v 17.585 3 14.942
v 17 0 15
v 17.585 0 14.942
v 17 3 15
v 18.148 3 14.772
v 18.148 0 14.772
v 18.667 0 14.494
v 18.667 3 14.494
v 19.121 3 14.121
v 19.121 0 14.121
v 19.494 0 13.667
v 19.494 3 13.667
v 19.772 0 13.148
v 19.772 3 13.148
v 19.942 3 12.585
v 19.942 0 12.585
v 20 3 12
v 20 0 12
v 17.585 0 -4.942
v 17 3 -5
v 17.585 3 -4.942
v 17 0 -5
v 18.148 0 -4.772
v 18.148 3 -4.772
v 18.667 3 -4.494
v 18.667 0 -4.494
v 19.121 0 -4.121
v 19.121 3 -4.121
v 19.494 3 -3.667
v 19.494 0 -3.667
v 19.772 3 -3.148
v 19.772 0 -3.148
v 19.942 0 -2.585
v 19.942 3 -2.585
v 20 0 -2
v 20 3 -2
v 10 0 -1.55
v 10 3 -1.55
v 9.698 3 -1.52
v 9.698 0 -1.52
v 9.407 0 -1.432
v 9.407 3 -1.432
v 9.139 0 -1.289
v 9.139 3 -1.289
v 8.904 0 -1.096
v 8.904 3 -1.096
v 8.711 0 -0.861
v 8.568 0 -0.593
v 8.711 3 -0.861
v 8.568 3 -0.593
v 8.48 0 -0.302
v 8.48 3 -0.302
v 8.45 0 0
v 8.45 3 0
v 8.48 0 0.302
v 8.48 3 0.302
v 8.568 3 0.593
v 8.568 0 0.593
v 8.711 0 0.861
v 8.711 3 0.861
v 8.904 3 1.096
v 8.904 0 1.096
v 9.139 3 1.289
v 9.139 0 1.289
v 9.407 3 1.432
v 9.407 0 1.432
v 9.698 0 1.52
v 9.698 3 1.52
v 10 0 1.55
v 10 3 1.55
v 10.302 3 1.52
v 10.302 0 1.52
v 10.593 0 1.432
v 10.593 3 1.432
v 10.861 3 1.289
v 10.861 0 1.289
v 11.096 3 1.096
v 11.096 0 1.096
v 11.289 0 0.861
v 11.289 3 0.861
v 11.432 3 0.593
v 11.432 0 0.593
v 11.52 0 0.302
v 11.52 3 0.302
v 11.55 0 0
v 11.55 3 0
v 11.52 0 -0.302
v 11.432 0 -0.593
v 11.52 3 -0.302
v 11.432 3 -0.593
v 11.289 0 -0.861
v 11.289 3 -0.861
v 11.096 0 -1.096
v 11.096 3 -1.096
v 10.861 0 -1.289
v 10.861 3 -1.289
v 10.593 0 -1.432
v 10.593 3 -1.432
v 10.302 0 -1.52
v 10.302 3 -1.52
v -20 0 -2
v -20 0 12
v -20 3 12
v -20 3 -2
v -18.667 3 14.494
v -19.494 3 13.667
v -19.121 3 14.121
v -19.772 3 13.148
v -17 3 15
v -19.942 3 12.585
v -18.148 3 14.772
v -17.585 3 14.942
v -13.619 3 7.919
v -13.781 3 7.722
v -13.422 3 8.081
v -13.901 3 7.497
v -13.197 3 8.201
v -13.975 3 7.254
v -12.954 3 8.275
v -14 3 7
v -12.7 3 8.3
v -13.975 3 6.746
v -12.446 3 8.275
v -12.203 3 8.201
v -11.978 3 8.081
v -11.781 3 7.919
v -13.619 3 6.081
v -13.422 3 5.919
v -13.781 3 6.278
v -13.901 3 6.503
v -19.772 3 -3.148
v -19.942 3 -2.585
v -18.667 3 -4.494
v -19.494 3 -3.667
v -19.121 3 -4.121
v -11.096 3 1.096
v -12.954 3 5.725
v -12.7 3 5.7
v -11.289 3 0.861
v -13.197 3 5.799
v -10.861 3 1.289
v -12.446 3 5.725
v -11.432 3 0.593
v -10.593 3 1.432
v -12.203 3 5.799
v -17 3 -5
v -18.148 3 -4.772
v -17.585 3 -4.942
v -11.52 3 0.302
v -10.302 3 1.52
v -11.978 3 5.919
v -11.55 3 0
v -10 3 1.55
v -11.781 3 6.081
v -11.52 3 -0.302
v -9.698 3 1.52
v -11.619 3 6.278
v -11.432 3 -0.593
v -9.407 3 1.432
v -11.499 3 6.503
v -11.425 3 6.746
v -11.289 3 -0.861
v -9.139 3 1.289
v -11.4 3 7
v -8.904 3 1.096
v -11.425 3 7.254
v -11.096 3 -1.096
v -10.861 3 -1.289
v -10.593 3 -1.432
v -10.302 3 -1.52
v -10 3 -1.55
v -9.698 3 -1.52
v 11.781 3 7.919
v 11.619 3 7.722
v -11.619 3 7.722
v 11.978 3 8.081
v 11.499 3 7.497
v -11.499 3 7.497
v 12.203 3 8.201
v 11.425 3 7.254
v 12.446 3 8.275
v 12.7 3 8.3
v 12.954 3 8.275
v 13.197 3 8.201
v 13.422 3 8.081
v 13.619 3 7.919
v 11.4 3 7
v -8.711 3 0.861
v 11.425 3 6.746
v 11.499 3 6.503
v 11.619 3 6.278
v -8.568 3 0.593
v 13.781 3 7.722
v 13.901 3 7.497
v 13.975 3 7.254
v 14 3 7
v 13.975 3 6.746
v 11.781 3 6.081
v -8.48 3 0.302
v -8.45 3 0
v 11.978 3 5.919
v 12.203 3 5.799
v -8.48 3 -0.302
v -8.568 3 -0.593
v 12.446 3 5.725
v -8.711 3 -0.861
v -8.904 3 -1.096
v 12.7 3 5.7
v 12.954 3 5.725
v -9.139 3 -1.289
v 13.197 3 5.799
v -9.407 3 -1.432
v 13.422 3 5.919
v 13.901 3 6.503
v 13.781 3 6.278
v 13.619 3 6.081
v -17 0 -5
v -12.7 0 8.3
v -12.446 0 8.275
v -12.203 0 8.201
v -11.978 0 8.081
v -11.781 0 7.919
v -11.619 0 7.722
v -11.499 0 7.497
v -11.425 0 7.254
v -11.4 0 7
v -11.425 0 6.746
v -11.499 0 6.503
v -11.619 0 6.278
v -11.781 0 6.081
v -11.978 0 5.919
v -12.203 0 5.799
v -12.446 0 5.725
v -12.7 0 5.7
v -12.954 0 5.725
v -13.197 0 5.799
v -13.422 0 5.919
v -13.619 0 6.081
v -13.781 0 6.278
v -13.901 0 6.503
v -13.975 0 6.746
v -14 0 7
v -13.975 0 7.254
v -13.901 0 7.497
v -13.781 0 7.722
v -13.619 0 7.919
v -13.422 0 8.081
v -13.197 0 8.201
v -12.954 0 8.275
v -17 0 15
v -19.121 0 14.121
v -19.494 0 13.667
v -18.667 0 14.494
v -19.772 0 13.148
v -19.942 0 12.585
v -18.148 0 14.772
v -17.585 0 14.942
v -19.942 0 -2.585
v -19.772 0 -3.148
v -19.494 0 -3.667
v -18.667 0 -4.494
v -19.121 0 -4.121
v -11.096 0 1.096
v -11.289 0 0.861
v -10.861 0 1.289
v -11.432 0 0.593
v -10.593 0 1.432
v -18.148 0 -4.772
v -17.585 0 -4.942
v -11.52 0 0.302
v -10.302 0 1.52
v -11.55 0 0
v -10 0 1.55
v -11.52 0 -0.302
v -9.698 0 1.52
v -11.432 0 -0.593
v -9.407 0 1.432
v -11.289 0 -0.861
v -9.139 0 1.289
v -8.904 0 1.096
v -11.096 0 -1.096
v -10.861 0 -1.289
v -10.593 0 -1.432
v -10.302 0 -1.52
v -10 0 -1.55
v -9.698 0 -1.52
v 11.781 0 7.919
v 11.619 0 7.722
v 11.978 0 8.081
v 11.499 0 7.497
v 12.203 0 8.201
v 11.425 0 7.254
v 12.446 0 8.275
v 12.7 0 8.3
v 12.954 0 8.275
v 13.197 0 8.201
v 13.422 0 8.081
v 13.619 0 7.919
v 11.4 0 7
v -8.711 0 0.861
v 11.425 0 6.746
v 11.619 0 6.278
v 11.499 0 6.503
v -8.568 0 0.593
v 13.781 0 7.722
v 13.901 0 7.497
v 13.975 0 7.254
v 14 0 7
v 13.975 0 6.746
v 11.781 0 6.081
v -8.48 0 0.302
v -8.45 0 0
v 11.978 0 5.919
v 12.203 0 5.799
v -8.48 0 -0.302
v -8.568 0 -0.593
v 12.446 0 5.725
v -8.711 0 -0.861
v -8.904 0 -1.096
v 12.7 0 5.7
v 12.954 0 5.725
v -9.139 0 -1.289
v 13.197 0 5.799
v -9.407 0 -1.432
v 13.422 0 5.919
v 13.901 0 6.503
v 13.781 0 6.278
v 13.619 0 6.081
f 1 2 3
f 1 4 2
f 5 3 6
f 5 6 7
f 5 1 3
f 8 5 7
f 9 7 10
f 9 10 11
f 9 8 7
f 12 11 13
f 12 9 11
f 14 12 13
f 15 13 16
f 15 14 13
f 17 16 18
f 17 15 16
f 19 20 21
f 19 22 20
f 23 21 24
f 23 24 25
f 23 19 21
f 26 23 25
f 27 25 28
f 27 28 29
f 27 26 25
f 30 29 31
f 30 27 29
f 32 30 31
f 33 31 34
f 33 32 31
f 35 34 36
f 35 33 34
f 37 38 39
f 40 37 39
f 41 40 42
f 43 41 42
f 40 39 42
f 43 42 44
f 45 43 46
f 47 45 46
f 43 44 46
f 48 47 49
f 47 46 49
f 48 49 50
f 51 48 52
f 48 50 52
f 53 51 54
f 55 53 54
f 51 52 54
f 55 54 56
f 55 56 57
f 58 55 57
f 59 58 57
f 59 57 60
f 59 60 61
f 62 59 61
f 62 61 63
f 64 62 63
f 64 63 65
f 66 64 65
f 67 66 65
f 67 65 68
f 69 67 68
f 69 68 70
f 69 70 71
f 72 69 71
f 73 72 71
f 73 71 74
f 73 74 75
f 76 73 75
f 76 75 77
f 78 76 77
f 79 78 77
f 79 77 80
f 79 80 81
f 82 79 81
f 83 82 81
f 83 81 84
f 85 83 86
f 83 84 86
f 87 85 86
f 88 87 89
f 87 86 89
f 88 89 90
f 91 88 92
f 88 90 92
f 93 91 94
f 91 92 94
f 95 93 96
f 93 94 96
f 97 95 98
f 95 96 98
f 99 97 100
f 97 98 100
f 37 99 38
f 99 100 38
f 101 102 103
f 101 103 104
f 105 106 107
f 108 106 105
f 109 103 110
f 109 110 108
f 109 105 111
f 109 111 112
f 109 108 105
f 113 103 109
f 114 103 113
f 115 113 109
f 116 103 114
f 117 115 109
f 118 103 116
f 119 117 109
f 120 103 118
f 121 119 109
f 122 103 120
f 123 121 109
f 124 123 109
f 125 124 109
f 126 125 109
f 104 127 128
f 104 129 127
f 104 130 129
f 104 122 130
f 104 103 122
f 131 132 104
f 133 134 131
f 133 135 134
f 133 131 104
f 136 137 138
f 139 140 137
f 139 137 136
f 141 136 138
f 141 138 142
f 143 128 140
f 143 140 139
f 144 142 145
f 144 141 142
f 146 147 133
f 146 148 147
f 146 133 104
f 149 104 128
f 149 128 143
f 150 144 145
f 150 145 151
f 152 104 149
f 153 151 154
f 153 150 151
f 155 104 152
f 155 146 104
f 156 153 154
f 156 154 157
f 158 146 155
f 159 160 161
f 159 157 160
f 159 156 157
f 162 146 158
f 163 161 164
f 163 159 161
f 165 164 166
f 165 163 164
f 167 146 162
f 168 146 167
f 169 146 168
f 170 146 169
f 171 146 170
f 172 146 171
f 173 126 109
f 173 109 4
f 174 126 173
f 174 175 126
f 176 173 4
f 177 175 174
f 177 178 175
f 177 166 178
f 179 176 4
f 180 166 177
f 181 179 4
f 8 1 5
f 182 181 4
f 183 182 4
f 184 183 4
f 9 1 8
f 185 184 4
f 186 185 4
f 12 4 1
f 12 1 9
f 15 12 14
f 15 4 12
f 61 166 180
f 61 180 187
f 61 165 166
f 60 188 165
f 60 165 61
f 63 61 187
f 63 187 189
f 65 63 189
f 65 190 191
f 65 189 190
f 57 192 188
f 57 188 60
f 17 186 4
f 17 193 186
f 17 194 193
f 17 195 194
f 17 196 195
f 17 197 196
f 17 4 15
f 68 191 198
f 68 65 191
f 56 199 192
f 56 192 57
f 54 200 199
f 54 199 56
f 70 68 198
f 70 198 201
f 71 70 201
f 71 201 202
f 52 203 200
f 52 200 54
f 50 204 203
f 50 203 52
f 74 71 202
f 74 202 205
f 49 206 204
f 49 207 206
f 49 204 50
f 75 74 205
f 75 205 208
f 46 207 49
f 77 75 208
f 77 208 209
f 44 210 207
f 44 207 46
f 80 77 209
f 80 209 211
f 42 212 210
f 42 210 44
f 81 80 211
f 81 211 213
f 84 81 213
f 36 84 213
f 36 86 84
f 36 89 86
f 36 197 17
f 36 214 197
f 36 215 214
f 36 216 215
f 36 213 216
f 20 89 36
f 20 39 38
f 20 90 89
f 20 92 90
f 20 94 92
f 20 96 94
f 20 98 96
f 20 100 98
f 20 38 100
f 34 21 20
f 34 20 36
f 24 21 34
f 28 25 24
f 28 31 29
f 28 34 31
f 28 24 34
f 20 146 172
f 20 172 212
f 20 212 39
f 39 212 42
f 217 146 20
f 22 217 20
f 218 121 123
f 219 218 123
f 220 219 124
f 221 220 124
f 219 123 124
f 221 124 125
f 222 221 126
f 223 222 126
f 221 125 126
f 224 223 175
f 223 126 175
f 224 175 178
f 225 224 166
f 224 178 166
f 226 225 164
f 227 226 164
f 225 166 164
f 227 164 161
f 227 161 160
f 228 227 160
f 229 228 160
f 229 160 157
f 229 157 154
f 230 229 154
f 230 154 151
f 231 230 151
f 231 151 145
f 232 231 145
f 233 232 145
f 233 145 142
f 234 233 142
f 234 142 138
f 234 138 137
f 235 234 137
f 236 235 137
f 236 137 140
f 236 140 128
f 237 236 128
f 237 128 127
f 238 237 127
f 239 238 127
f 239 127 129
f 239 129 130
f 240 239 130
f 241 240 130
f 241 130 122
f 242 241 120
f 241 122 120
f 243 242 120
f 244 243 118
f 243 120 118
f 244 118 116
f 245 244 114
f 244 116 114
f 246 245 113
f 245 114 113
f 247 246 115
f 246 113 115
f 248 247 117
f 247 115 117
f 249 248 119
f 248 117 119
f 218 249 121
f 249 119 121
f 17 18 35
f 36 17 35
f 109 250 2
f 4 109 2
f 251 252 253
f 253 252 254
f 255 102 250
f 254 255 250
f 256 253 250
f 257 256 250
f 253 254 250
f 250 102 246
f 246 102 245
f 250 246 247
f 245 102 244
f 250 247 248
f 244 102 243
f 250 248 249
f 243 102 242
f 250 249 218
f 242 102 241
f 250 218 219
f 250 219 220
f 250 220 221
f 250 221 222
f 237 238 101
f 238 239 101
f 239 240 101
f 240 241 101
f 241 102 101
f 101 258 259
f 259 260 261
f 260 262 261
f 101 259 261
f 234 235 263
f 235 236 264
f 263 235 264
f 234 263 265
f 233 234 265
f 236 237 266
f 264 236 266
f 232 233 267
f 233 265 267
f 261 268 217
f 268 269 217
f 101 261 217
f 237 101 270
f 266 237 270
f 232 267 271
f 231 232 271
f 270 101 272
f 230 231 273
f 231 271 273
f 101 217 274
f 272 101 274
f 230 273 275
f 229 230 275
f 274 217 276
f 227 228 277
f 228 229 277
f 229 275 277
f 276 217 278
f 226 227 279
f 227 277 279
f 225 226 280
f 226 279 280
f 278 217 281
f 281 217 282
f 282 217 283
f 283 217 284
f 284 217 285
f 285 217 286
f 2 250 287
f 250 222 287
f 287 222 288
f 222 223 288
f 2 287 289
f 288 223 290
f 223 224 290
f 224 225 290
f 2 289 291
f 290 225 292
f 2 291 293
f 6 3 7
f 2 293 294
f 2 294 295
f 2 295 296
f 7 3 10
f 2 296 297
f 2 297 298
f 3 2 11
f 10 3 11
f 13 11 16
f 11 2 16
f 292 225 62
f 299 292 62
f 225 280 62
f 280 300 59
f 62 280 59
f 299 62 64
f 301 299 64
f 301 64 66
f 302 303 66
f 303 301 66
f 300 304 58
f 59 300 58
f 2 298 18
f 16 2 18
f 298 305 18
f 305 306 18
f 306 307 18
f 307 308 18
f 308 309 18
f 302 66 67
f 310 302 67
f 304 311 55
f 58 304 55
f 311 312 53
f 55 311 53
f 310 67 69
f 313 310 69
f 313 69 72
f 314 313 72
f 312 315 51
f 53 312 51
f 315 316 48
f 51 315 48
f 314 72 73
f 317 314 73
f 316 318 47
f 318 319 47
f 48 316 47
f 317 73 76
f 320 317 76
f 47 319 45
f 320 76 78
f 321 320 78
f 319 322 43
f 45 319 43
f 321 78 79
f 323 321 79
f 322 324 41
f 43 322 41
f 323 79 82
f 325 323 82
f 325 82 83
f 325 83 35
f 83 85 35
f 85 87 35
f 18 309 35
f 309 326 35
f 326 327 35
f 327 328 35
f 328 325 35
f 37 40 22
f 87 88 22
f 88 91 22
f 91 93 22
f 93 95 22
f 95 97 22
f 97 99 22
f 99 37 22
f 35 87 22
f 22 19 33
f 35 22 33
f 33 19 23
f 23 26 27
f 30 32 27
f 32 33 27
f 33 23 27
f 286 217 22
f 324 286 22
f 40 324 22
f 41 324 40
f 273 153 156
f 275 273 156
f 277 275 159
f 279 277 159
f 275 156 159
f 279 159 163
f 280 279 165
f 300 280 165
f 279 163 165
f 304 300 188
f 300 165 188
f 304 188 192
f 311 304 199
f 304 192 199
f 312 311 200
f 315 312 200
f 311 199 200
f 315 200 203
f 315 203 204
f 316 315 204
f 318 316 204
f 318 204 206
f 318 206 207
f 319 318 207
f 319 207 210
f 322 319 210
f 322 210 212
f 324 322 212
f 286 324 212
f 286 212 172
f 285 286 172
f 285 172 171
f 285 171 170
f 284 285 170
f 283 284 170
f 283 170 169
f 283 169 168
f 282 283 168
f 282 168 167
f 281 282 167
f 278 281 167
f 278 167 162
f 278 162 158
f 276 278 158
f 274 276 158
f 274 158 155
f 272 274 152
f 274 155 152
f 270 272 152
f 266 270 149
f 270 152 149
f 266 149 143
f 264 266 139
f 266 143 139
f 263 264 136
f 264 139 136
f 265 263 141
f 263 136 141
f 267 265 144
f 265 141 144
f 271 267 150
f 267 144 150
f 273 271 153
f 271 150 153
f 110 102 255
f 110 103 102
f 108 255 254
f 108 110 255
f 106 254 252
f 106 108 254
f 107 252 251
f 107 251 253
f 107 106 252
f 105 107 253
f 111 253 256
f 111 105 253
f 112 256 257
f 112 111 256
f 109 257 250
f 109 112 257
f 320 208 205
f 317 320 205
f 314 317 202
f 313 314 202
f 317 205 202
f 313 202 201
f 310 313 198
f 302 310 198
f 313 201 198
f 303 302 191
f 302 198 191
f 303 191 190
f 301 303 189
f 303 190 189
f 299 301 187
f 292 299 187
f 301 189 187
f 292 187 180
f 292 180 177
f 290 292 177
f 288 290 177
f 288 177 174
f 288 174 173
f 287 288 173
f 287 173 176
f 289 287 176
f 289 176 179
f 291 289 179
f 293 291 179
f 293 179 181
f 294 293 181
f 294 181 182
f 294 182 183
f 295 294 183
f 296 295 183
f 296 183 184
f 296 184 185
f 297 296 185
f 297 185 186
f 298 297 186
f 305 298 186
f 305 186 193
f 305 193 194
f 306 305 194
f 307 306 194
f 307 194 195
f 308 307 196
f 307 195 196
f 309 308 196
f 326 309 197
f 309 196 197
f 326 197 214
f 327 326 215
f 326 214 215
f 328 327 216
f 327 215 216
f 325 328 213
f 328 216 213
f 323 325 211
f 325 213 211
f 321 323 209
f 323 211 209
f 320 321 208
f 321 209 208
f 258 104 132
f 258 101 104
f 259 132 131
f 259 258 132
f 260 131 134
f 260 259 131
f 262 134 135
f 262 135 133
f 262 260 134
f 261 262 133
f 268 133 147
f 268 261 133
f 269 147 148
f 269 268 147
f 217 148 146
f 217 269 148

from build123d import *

# Parameters (mm, degrees)
SKETCH_1_W          = 40
SKETCH_1_H          = 30
EXTRUDE_1_DEPTH     = 3
SKETCH_2_R          = 1.55
CUT_EXTRUDE_1_DEPTH = 26.179356624
SKETCH_3_W          = 40
SKETCH_3_H          = 10
CUT_EXTRUDE_2_DEPTH = 26.179356624
FILLET_2_R          = 3
SKETCH_4_R          = 1.3
CUT_EXTRUDE_3_DEPTH = 26.179356624


with BuildPart() as part:
    # 草图1 → 凸台-拉伸1 (new body)
    with BuildSketch(Plane(origin=(0, 0, 0), x_dir=(1, 0, 0), z_dir=(0, 1, 0))):
        Rectangle(SKETCH_1_W, SKETCH_1_H)
    extrude(amount=EXTRUDE_1_DEPTH)

    # 草图2 → 切除-拉伸1 (cut, through all)
    with BuildSketch(Plane(origin=(0, 3, 0), x_dir=(1, 0, 0), z_dir=(0, 1, 0))):
        with Locations(Location((-10, 0, 0), (0, 0, 270))):
            Circle(SKETCH_2_R)
        with Locations(Location((10, 0, 0), (0, 0, 90))):
            Circle(SKETCH_2_R)
    extrude(amount=-CUT_EXTRUDE_1_DEPTH, mode=Mode.SUBTRACT)

    # 草图3 → 切除-拉伸2 (cut, through all)
    with BuildSketch(Plane(origin=(0, 3, 0), x_dir=(1, 0, 0), z_dir=(0, 1, 0))):
        with Locations((0, 10)):
            Rectangle(SKETCH_3_W, SKETCH_3_H)
    extrude(amount=-CUT_EXTRUDE_2_DEPTH, mode=Mode.SUBTRACT)

    # 圆角2
    fillet_2_edges = [part.edges().sort_by_distance(p)[0] for p in [
        (-20, 1.5, -5),
        (20, 1.5, -5),
        (20, 1.5, 15),
        (-20, 1.5, 15),
    ]]
    fillet(fillet_2_edges, radius=FILLET_2_R)

    # 草图4 → 切除-拉伸3 (cut, through all)
    with BuildSketch(Plane(origin=(0, 3, 0), x_dir=(1, 0, 0), z_dir=(0, 1, 0))):
        with Locations(Location((-12.7, -7, 0), (0, 0, 270))):
            Circle(SKETCH_4_R)
        with Locations(Location((12.7, -7, 0), (0, 0, 90))):
            Circle(SKETCH_4_R)
    extrude(amount=-CUT_EXTRUDE_3_DEPTH, mode=Mode.SUBTRACT)


solid = part.part
